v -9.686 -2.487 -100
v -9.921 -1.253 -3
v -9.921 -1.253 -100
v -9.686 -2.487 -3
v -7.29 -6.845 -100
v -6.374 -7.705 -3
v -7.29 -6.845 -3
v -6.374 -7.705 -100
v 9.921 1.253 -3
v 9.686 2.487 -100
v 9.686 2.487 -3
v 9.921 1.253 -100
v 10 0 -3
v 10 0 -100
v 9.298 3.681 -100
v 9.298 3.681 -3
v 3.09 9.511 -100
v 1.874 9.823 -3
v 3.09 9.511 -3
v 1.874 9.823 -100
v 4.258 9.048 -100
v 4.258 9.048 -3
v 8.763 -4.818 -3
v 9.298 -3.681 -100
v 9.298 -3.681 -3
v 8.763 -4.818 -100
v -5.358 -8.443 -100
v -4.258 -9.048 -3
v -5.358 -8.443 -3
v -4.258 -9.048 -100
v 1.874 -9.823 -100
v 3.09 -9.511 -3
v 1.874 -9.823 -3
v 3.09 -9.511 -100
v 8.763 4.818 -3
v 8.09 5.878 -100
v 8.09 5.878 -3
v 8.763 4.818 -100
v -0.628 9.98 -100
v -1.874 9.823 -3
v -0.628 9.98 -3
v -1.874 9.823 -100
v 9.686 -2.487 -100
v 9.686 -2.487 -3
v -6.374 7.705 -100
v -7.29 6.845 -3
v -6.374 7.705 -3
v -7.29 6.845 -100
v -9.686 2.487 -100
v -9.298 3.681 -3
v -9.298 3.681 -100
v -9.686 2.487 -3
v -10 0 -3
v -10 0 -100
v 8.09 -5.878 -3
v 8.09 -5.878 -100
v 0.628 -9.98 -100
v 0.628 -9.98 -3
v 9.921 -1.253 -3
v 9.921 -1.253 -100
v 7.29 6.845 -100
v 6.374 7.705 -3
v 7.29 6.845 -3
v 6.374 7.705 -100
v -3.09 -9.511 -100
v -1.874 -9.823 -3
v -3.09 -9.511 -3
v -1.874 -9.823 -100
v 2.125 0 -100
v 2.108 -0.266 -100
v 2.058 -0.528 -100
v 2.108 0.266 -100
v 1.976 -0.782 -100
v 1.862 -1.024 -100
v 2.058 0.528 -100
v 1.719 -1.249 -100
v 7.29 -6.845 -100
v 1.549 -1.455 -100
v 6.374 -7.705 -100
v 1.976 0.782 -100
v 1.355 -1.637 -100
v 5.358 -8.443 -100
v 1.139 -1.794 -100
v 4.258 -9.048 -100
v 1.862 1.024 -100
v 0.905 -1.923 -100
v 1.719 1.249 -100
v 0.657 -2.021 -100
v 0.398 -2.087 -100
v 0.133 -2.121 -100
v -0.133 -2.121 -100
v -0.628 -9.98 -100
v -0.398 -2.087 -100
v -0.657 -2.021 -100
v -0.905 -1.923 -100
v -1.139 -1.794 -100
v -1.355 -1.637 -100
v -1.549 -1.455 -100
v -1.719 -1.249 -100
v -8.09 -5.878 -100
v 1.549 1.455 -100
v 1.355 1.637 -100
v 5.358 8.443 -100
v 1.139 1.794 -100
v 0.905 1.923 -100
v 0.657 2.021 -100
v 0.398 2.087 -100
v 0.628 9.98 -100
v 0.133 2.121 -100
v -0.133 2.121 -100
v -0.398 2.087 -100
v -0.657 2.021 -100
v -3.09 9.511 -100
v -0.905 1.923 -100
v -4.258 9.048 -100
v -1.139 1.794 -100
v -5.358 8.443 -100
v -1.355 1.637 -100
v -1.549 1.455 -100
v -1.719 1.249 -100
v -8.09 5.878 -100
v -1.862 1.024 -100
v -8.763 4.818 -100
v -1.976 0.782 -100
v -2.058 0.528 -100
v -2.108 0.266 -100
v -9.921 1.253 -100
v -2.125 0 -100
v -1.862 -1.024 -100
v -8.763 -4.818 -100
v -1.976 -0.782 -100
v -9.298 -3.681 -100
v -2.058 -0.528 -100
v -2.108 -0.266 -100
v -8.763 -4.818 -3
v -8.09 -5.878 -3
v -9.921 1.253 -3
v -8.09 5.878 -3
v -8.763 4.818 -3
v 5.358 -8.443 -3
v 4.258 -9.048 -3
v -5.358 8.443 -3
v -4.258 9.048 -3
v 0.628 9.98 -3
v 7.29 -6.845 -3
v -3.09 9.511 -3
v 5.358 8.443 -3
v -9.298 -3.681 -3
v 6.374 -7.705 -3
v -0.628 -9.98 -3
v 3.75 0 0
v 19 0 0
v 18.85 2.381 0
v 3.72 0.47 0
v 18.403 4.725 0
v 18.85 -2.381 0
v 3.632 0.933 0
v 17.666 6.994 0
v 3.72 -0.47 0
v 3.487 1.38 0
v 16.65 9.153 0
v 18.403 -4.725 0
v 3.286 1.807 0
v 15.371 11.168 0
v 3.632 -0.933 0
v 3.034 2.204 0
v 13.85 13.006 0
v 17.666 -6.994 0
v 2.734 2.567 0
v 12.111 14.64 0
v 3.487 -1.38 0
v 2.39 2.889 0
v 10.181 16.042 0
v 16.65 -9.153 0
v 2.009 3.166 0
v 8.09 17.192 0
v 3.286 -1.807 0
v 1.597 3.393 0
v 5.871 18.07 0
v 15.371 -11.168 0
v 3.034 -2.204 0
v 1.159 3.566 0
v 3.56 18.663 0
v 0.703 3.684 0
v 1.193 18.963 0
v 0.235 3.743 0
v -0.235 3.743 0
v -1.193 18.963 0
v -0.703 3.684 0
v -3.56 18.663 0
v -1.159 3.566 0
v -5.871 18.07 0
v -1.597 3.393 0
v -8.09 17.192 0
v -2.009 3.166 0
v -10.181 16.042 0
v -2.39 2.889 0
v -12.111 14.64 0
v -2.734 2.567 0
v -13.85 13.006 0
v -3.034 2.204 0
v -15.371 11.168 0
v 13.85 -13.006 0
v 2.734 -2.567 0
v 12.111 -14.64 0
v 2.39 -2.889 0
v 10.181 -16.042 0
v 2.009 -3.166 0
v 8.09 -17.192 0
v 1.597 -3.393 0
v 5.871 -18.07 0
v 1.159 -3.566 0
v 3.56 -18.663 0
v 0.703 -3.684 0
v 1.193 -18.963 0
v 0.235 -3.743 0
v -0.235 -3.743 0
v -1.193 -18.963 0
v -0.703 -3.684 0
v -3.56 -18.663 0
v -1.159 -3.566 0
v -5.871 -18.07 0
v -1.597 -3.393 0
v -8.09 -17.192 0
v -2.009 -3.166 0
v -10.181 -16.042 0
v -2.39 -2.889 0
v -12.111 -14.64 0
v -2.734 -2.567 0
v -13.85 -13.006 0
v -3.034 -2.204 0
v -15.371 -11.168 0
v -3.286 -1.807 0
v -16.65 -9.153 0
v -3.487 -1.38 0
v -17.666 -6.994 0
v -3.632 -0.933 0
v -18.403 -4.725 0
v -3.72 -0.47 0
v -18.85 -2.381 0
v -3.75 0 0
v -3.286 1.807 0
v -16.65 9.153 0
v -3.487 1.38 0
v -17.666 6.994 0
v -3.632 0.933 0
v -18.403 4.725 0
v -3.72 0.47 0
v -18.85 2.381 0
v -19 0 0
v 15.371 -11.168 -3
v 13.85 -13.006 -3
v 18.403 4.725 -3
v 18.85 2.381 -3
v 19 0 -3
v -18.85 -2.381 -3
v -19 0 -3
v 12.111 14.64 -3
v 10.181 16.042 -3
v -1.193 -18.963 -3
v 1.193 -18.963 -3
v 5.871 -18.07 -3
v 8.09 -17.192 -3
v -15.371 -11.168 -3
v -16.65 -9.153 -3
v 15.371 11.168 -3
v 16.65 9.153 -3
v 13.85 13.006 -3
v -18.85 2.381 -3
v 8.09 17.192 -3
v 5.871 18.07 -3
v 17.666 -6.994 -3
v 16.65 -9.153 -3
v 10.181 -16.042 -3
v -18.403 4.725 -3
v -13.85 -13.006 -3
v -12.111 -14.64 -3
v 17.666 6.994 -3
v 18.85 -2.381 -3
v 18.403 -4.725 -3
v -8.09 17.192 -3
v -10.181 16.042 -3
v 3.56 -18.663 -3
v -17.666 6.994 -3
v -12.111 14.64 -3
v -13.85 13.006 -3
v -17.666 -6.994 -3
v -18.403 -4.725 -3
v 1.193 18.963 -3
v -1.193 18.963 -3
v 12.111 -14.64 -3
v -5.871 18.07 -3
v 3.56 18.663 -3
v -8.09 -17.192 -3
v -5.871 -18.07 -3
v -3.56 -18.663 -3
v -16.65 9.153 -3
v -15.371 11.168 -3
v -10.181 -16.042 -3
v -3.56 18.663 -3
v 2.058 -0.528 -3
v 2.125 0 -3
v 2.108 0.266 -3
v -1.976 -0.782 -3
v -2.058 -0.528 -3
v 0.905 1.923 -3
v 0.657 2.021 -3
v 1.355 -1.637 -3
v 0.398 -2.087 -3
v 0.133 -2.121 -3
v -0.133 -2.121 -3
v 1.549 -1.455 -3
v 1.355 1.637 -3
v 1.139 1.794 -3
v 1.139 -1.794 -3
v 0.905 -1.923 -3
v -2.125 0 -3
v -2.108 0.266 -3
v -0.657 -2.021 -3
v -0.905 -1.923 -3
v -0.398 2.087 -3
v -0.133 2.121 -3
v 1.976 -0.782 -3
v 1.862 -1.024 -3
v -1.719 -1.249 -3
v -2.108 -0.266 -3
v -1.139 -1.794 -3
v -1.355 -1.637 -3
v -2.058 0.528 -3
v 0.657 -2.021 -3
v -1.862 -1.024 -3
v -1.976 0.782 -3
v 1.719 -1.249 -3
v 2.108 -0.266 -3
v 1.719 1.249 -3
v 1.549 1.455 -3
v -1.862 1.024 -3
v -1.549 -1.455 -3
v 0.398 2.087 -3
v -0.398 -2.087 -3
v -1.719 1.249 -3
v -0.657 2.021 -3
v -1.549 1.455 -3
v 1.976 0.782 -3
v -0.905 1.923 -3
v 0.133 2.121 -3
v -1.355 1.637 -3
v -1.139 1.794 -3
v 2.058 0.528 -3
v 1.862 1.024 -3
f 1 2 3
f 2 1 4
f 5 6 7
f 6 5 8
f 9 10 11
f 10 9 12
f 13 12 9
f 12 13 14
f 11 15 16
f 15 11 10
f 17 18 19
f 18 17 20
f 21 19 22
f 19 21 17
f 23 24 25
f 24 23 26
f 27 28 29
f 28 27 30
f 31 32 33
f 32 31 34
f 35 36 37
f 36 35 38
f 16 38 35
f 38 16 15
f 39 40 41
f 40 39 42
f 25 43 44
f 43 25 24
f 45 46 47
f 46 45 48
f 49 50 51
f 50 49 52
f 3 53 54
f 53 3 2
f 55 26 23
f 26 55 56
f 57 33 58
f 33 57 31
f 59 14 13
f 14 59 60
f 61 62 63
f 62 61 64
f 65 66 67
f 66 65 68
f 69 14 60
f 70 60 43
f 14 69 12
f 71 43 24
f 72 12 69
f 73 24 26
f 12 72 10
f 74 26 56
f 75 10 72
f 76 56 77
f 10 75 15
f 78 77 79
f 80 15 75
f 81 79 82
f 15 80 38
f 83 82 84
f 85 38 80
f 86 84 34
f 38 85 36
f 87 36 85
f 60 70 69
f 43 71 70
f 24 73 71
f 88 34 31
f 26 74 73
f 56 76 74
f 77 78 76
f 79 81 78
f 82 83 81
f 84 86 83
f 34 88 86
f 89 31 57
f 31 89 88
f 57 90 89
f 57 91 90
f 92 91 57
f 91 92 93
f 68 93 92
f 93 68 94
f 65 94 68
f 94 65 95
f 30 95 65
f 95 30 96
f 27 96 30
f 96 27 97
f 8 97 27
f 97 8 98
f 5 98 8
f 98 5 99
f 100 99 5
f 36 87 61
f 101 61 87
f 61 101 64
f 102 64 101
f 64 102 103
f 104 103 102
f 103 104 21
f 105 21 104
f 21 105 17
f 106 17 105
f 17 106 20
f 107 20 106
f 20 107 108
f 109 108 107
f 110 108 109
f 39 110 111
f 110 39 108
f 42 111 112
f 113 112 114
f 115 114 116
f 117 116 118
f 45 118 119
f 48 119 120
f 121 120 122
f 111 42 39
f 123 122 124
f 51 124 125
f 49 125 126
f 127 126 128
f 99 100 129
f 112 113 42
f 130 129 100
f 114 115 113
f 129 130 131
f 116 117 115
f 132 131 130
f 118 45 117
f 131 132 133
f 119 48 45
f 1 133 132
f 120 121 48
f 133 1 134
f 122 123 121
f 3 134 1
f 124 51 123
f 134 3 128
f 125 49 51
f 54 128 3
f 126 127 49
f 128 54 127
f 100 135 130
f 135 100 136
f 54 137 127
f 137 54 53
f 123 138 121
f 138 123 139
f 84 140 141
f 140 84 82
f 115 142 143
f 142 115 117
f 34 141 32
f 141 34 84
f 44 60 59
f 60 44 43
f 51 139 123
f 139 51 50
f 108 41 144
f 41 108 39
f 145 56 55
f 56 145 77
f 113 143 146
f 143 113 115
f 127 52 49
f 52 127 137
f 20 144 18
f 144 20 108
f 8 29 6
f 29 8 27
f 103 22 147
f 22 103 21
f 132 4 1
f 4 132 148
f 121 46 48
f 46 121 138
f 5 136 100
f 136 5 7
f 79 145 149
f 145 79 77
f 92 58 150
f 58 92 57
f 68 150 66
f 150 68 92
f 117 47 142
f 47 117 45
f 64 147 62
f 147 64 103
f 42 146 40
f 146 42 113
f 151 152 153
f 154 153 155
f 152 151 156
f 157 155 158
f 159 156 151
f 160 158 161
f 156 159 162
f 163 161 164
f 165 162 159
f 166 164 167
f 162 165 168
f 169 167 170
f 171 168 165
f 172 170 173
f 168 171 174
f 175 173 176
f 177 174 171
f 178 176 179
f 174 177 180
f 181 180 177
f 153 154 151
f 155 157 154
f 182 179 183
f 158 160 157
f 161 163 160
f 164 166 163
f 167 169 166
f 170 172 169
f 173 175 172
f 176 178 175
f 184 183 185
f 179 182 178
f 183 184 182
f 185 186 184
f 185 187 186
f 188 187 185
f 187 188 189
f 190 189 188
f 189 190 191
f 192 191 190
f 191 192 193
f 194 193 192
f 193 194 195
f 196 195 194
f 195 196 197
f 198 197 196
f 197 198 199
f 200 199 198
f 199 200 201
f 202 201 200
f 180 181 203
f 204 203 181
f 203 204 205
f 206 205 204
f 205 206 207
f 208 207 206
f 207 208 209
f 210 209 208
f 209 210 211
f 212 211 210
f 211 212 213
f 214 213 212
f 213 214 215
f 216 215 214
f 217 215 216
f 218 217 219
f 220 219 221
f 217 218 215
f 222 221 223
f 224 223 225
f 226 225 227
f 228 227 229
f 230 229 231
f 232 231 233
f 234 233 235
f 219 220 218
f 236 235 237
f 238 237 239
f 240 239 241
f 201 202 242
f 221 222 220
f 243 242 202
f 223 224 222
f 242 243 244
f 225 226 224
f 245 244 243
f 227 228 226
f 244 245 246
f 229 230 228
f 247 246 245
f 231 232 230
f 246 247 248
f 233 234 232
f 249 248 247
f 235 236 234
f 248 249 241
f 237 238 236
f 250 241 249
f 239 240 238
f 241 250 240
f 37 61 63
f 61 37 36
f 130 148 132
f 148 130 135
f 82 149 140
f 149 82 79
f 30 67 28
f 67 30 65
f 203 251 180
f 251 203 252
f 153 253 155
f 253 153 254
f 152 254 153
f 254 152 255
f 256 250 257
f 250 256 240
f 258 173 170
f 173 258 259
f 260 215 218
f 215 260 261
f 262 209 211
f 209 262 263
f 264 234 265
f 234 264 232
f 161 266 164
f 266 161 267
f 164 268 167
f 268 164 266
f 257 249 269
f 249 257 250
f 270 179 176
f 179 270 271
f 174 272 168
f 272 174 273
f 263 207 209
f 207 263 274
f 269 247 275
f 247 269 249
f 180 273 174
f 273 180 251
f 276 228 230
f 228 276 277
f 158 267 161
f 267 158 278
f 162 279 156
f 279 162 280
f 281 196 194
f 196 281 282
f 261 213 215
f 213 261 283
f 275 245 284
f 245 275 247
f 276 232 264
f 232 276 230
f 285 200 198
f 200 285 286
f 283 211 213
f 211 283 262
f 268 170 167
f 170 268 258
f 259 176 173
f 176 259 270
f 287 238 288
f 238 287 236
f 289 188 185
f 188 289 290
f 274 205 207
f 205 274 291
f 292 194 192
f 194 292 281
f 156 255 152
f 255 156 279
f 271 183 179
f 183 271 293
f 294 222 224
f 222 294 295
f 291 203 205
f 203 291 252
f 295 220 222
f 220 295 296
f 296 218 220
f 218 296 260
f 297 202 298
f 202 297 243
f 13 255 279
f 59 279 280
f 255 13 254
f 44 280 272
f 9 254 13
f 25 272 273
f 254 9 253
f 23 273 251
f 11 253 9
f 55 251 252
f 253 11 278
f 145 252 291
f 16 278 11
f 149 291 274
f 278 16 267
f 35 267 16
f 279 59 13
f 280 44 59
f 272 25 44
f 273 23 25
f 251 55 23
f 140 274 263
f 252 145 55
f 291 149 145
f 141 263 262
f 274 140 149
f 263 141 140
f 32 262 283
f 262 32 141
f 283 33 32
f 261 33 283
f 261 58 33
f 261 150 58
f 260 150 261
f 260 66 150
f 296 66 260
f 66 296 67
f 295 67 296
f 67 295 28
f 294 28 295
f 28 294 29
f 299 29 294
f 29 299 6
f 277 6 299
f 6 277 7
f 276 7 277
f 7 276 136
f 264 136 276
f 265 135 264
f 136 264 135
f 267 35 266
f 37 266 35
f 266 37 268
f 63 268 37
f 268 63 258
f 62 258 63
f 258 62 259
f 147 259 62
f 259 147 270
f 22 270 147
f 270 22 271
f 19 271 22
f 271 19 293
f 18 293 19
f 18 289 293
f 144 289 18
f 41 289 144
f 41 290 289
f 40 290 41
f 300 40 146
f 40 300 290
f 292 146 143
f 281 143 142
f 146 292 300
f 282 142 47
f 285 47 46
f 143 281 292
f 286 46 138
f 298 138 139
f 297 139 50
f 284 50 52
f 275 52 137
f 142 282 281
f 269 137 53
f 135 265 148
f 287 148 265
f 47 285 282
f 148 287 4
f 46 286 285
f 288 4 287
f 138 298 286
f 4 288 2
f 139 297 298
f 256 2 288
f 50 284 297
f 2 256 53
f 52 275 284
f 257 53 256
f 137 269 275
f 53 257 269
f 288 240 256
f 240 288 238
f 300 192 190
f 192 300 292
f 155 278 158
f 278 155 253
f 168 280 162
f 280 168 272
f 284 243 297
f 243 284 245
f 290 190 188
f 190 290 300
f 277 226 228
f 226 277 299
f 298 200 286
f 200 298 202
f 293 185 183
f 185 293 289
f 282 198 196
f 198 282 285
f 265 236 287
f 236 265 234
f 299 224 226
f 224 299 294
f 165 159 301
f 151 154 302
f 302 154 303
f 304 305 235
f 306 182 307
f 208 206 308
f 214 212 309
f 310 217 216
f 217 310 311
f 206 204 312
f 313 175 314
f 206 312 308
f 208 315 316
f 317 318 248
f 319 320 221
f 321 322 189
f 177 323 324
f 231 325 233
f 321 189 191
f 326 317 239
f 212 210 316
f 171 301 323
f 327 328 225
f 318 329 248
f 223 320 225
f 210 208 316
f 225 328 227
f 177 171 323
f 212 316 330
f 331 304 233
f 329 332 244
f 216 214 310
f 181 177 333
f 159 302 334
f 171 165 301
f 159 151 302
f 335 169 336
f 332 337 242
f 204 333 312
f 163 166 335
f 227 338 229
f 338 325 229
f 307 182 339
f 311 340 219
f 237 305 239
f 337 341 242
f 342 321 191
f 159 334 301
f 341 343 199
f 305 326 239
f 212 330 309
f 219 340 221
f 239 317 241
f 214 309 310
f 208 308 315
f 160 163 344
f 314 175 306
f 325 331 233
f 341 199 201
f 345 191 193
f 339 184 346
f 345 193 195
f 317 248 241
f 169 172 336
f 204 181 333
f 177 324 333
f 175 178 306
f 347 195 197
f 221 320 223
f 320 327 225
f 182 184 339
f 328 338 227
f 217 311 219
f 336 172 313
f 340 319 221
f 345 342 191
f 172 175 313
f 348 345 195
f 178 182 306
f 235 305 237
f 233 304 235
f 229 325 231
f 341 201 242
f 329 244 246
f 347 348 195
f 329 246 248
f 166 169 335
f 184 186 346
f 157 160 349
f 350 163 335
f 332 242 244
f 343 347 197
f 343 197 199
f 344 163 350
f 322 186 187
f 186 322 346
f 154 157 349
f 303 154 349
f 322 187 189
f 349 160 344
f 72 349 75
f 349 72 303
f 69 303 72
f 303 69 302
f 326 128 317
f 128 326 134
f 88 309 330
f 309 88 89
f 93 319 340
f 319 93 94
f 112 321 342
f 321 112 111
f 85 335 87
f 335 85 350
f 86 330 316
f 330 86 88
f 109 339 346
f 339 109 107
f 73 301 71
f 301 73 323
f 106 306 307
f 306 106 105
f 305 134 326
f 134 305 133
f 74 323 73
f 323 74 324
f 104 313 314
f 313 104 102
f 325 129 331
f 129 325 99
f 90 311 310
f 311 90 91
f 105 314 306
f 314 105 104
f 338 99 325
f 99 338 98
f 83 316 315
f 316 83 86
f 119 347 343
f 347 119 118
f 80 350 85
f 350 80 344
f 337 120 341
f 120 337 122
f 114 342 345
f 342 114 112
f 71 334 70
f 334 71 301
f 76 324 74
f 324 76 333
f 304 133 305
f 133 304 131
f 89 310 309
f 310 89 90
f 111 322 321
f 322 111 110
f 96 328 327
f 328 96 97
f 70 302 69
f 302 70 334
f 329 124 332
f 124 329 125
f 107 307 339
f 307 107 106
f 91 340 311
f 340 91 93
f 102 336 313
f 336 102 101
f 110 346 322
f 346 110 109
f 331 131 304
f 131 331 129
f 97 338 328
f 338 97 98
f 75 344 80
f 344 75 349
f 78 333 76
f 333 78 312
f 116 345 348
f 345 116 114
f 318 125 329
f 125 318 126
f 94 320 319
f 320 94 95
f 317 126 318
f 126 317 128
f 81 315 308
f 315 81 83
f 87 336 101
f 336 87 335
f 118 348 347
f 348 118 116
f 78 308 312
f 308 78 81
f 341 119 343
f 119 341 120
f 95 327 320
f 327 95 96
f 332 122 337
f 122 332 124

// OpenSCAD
$fn = 50;


difference() {
	union() {
		translate(v = [0, 0, -100.0000000000]) {
			cylinder(h = 100, r = 10.0000000000);
		}
		translate(v = [0, 0, -3.0000000000]) {
			cylinder(h = 3, r = 19.0000000000);
		}
	}
	union() {
		translate(v = [0, 0, 0]) {
			rotate(a = [0, 0, 0]) {
				difference() {
					union() {
						#translate(v = [0, 0, -100.0000000000]) {
							cylinder(h = 100, r = 2.0000000000);
						}
						#translate(v = [0, 0, -3]) {
							cylinder(h = 3, r = 10.0000000000, r1 = 2.1250000000, r2 = 3.7500000000);
						}
						#translate(v = [0, 0, -100.0000000000]) {
							cylinder(h = 100, r = 2.1250000000);
						}
						#translate(v = [0, 0, -100.0000000000]) {
							cylinder(h = 100, r = 2.0000000000);
						}
					}
					union();
				}
			}
		}
	}
}
